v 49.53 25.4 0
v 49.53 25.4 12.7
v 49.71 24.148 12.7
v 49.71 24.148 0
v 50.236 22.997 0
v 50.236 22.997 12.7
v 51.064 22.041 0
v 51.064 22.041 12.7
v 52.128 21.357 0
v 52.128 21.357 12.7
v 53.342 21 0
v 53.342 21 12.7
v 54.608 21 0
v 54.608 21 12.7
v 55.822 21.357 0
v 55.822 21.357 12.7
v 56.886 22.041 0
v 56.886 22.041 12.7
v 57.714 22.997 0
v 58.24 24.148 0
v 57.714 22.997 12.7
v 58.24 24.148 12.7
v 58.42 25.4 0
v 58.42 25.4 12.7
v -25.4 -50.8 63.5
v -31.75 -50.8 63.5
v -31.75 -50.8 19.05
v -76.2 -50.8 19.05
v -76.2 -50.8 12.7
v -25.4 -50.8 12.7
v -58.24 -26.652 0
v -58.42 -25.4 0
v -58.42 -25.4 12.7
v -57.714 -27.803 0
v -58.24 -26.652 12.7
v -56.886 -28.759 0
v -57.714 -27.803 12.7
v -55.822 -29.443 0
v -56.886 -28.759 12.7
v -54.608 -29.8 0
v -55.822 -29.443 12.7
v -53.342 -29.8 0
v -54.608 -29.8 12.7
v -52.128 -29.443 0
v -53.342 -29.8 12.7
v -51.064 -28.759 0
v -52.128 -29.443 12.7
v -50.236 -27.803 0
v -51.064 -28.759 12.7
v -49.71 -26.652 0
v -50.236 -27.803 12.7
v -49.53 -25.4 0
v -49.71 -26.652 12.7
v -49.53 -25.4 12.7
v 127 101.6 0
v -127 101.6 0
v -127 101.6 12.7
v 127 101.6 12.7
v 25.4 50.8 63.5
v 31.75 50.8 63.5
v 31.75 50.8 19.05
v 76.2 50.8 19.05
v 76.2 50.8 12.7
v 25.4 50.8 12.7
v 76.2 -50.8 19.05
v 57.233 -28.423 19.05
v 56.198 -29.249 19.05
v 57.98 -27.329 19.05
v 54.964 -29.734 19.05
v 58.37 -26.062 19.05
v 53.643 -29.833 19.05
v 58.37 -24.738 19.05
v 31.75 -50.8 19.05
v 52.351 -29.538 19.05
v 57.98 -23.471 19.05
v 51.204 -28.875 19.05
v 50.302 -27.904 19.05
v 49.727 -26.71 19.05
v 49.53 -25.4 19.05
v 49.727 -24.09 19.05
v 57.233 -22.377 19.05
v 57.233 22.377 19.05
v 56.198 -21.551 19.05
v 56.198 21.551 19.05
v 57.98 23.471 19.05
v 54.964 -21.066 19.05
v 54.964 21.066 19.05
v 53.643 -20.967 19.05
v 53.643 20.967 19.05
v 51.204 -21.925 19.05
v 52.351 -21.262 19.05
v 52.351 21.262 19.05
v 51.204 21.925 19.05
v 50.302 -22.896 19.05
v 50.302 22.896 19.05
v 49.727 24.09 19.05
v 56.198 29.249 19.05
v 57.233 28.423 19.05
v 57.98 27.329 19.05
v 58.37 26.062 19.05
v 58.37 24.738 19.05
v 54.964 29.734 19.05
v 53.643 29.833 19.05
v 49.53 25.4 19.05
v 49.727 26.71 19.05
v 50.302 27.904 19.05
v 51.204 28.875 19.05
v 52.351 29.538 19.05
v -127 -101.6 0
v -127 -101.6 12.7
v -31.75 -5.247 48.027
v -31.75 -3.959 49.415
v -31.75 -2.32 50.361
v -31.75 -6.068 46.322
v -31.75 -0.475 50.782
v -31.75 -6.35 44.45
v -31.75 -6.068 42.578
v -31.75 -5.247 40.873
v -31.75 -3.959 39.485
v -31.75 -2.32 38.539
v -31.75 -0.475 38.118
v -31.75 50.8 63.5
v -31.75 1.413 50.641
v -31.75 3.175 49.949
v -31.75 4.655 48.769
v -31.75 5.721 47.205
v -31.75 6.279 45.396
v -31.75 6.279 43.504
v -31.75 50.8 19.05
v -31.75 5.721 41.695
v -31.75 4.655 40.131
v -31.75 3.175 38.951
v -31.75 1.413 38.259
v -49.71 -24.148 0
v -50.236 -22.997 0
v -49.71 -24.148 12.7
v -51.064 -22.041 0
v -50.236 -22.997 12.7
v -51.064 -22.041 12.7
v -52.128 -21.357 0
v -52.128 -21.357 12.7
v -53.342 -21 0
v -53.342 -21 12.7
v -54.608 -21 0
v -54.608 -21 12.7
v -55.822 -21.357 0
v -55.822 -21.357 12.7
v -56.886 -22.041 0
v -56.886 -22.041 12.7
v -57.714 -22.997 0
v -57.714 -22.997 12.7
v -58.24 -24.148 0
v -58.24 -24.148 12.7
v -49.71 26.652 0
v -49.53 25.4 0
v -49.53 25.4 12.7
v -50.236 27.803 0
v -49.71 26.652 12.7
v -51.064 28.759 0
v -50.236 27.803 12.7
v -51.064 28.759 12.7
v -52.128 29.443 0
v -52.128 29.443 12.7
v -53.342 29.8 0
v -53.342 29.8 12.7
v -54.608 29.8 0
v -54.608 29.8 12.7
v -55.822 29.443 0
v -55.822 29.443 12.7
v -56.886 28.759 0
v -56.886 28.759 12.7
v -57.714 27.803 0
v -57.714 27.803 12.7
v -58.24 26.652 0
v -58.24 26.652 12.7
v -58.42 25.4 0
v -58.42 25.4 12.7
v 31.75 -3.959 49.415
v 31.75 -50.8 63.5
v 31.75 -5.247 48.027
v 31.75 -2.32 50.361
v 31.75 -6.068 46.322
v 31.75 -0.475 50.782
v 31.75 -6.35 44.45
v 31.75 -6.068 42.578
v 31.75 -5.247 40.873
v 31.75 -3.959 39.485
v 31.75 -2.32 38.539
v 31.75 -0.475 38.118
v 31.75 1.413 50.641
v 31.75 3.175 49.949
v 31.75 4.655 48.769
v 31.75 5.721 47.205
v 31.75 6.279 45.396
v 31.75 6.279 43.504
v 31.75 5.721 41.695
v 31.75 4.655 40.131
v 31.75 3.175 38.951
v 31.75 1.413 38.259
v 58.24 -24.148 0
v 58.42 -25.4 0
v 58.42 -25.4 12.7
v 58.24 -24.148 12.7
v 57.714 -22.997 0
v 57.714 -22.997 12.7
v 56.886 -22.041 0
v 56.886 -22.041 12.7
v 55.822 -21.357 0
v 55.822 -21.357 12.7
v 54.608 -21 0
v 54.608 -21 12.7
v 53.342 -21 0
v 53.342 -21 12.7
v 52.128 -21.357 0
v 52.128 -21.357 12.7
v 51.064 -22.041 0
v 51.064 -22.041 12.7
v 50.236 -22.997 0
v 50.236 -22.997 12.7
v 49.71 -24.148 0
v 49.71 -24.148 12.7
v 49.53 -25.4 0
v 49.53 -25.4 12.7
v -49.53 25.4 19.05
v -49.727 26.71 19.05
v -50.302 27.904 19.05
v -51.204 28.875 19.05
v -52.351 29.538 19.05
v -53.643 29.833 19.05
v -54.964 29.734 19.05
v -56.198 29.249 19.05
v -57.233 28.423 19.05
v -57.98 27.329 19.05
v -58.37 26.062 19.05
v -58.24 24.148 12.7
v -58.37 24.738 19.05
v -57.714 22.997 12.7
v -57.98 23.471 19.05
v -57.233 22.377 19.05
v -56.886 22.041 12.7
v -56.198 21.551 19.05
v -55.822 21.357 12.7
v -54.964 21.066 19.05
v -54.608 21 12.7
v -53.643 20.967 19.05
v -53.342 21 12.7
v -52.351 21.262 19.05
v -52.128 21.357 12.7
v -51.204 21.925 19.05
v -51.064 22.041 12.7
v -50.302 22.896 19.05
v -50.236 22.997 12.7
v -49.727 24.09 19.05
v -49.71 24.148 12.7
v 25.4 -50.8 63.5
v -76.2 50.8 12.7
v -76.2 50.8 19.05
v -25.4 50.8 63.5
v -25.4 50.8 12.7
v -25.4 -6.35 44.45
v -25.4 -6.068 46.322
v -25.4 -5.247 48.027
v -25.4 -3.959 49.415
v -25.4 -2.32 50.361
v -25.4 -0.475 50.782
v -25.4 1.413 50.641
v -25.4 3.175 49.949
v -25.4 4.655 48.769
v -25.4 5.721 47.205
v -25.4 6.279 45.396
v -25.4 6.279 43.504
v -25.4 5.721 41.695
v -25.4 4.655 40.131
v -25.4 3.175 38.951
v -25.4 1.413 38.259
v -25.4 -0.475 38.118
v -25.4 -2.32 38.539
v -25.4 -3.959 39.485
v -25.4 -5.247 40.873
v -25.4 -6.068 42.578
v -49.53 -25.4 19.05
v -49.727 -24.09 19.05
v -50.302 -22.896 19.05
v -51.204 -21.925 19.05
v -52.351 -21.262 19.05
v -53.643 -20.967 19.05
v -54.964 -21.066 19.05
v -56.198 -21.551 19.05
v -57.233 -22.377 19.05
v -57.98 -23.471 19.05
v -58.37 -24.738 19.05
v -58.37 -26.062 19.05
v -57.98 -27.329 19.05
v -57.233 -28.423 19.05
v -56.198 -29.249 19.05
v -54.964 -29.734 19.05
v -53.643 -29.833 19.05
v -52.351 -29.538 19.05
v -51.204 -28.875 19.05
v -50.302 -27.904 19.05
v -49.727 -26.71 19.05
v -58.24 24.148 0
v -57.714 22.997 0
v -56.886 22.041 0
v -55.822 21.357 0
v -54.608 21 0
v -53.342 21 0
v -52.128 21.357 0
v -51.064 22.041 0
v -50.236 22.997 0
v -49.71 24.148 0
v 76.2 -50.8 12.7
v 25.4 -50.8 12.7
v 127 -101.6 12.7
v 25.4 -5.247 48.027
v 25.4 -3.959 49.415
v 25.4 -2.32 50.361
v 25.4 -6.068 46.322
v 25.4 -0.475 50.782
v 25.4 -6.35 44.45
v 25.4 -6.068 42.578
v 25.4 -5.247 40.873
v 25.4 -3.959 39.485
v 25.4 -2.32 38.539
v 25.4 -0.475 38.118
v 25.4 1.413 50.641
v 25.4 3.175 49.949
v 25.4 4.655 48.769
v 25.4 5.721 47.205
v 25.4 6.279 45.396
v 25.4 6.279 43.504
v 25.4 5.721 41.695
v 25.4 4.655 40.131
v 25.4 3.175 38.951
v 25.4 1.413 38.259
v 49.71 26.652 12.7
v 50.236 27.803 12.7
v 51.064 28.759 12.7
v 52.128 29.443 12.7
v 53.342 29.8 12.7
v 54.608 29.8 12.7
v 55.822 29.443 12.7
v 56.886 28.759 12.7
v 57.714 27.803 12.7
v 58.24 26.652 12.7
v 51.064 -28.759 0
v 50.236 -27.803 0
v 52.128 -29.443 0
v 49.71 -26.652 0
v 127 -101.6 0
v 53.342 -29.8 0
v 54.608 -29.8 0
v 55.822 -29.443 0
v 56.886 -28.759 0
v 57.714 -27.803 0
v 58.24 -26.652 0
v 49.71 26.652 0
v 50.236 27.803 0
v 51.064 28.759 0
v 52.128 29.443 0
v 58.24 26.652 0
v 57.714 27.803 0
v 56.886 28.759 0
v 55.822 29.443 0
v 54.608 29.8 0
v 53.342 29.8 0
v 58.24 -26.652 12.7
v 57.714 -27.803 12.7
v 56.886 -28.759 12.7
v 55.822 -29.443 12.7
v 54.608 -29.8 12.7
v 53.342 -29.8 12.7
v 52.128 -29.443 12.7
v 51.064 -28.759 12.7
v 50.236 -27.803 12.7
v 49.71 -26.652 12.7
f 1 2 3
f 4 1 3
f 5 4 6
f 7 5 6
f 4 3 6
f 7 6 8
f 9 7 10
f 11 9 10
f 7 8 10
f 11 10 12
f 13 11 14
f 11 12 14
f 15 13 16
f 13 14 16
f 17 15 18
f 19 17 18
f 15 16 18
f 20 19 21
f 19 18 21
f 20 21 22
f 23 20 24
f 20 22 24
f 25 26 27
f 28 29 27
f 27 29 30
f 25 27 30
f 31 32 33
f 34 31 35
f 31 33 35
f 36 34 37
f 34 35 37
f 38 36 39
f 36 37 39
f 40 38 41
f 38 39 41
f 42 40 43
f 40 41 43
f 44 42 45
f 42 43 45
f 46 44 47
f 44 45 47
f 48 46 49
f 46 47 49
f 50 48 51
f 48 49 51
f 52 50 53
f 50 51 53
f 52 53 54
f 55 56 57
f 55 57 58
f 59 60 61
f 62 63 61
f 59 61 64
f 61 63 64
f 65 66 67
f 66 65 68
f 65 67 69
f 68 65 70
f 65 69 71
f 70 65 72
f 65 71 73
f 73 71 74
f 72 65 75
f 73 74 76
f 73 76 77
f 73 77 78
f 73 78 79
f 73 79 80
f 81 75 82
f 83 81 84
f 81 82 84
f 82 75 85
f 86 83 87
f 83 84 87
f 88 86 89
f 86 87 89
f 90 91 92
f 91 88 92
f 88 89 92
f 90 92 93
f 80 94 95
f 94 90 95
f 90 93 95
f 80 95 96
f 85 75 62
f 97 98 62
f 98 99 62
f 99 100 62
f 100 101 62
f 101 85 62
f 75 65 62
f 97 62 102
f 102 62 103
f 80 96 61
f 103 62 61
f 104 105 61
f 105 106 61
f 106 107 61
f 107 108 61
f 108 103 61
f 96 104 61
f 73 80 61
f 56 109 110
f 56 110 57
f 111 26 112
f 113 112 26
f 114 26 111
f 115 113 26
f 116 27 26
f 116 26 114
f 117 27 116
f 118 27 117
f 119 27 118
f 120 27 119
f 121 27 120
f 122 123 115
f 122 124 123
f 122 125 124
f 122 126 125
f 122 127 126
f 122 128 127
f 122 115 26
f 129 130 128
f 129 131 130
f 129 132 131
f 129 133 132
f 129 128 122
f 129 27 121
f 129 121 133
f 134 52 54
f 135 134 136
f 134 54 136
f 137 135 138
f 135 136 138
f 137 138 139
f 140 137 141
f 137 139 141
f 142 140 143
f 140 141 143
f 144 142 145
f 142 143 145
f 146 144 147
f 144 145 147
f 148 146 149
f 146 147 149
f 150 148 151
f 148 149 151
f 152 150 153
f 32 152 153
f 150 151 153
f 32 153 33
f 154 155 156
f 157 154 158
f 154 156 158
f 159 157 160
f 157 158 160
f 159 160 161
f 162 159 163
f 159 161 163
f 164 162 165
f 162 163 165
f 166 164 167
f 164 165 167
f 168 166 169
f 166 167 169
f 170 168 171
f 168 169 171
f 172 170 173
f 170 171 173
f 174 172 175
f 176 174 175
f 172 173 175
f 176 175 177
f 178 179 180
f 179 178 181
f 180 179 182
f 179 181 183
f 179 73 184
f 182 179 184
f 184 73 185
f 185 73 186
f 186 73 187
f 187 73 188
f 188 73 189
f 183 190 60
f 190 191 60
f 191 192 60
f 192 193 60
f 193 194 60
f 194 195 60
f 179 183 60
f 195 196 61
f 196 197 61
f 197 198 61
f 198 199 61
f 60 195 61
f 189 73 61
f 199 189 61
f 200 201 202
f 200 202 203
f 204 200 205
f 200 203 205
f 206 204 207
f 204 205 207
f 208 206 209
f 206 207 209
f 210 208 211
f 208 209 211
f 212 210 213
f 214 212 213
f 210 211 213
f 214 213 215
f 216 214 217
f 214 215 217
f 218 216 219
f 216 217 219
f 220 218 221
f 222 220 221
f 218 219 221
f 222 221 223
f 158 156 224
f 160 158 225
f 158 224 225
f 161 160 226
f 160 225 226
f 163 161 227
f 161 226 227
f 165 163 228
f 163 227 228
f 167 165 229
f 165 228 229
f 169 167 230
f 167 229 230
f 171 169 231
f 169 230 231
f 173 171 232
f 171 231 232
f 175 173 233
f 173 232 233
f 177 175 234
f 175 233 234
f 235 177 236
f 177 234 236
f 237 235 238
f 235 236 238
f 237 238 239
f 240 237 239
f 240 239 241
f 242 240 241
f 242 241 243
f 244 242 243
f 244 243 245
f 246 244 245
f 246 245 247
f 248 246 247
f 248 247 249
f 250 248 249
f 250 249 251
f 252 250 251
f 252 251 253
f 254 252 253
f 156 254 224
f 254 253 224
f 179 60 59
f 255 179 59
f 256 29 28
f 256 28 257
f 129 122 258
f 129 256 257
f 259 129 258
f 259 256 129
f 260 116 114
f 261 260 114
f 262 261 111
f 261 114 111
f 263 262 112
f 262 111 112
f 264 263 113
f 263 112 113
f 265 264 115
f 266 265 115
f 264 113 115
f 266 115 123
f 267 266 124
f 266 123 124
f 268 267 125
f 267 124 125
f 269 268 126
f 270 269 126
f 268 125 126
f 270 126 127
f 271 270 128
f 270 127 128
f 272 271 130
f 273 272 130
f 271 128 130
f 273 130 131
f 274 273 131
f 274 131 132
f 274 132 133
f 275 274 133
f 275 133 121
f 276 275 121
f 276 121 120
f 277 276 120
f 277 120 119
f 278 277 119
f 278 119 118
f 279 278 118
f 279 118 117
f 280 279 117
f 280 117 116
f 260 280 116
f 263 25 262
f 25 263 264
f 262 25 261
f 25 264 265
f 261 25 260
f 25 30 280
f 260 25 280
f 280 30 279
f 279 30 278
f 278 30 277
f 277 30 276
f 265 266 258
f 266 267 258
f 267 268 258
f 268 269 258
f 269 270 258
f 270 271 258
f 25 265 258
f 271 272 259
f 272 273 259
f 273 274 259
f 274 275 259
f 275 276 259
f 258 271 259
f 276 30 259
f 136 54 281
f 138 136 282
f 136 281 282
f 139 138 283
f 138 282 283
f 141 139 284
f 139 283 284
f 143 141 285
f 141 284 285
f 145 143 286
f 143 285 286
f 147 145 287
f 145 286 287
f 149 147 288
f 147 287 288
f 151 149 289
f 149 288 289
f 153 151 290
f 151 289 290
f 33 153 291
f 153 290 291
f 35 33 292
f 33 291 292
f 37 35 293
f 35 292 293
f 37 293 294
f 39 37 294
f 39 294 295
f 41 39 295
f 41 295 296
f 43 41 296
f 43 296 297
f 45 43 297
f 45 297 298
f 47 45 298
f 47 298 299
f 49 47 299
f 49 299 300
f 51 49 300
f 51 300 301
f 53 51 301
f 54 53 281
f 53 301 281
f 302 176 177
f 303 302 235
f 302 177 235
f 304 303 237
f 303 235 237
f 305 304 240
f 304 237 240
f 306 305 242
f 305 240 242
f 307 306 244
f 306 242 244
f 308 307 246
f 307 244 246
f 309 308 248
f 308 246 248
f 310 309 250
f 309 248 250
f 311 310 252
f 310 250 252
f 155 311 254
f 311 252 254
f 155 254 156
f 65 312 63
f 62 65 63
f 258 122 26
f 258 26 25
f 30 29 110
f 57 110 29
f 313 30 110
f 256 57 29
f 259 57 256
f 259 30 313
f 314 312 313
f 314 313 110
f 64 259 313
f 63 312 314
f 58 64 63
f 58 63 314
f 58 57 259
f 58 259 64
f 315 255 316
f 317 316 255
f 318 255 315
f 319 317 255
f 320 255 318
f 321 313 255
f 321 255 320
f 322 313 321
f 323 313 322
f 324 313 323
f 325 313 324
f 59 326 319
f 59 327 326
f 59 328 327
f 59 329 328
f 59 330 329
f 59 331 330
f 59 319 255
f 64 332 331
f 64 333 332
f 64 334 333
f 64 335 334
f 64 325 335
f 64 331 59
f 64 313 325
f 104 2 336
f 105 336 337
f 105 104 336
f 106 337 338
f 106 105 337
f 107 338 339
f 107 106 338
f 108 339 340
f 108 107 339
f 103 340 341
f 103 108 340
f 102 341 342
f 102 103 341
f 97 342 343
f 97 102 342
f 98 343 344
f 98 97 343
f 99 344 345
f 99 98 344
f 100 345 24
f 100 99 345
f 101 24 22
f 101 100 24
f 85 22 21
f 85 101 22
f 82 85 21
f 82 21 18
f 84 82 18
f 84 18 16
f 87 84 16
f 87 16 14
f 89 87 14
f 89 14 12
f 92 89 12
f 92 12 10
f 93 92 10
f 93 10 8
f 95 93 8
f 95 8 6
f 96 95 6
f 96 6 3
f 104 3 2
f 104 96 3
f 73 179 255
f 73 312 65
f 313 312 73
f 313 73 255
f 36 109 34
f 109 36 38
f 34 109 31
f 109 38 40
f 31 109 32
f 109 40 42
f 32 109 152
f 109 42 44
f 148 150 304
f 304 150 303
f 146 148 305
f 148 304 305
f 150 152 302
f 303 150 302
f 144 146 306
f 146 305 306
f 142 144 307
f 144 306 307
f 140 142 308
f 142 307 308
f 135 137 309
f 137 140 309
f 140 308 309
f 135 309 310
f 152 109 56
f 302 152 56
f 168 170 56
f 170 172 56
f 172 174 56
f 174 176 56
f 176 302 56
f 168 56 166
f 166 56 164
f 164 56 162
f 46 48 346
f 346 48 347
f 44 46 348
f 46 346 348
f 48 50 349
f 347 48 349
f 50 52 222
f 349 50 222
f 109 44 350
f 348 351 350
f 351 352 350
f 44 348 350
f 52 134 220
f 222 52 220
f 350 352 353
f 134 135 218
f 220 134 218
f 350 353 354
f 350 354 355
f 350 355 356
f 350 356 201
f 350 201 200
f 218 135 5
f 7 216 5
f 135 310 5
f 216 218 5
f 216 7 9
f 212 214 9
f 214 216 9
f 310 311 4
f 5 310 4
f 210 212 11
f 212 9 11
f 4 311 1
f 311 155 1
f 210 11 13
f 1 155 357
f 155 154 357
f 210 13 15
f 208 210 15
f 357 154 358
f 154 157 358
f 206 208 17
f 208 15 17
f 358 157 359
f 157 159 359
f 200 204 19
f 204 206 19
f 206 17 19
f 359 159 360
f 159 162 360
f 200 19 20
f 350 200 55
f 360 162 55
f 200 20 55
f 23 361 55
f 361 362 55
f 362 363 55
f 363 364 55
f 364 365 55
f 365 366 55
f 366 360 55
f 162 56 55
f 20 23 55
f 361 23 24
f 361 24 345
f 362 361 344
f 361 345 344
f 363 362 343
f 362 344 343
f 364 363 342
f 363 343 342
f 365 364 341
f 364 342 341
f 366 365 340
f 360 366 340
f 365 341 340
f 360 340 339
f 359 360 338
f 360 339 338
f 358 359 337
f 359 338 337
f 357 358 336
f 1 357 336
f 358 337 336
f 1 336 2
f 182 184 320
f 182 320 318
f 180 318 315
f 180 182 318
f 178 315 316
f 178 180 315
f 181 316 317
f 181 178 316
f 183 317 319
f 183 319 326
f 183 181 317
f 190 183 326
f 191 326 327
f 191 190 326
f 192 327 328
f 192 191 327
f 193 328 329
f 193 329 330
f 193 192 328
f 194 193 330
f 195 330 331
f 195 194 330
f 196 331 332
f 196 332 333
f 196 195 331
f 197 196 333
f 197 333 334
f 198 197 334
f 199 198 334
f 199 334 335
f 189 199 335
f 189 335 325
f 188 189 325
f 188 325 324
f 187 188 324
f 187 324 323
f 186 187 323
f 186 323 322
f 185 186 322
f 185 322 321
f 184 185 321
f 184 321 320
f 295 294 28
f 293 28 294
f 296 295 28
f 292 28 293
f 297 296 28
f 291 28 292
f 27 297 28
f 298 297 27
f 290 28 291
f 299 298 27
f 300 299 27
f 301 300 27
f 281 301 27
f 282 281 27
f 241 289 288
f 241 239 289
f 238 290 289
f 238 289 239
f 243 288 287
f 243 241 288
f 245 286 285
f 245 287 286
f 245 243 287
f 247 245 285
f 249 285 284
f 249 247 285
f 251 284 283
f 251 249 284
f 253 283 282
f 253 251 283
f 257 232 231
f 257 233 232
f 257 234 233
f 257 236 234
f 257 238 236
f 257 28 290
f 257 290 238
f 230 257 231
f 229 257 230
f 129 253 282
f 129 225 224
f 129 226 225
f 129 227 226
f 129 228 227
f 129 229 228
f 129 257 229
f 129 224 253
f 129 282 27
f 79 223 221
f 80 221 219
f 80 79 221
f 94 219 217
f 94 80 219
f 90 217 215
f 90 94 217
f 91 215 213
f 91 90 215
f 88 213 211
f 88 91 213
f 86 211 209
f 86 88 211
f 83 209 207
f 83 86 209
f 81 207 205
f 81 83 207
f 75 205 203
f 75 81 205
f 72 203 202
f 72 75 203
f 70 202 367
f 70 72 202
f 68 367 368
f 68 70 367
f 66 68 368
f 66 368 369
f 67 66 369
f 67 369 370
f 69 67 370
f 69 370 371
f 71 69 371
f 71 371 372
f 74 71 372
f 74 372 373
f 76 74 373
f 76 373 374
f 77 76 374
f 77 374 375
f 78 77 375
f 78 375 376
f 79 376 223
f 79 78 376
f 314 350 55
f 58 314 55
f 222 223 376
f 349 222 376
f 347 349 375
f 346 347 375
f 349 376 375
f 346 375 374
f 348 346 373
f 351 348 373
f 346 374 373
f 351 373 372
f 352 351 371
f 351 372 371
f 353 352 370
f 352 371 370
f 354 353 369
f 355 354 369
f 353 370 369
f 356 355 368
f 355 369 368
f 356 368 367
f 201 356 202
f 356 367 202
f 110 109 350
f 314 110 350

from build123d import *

# Parameters (mm, degrees)
F0_W      = 254
F0_H      = 203.2
F1_DEPTH  = 12.7
F2_R      = 4.445
F3_DEPTH  = 25.4
F4_W      = 50.8
F4_H      = 101.6
F5_DEPTH  = 6.35
F6_W      = 6.35
F6_H      = 101.6
F7_DEPTH  = 44.45
F8_R      = 4.445
F9_DEPTH  = 25.4
F10_R     = 6.35
F11_DEPTH = 25.4


with BuildPart() as f1:
    # F0 (on Top) → F1 (new body)
    with BuildSketch(Plane.XY):
        Rectangle(F0_W, F0_H)
    extrude(amount=F1_DEPTH)

    # F2 (on face) → F3 (cut)
    with BuildSketch(Plane.XY.offset(12.7)):
        with Locations((-53.975, 25.4)):
            Circle(F2_R)
        with Locations((-53.975, -25.4)):
            Circle(F2_R)
        with Locations((53.975, -25.4)):
            Circle(F2_R)
        with Locations((53.975, 25.4)):
            Circle(F2_R)
    extrude(amount=-F3_DEPTH, mode=Mode.SUBTRACT)

    # F4 (on face) → F5 (join)
    with BuildSketch(Plane.XY.offset(12.7)):
        with Locations((-50.8, 0)):
            Rectangle(F4_W, F4_H)
    extrude(amount=F5_DEPTH)

    # F6 (on face) → F7 (join)
    with BuildSketch(Plane.XY.offset(19.05)):
        with Locations((-28.575, 0)):
            Rectangle(F6_W, F6_H)
    extrude(amount=F7_DEPTH)

    # F8 (on face) → F9 (cut)
    with BuildSketch(Plane.XY.offset(19.05)):
        with Locations((-53.975, 25.4)):
            Circle(F8_R)
        with Locations((-53.975, -25.4)):
            Circle(F8_R)
    extrude(amount=-F9_DEPTH, mode=Mode.SUBTRACT)

    # F10 (on face) → F11 (cut)
    with BuildSketch(Plane(origin=(-31.75, 0, 0), x_dir=(0, -1, 0), z_dir=(-1, 0, 0))):
        with Locations((0, 44.45)):
            Circle(F10_R)
    extrude(amount=-F11_DEPTH, mode=Mode.SUBTRACT)

    # F12: F1 across plane


with BuildPart() as f1_1:
    add(f1.part)
    add(f1.part.mirror(Plane.YZ))


solid = f1_1.part
